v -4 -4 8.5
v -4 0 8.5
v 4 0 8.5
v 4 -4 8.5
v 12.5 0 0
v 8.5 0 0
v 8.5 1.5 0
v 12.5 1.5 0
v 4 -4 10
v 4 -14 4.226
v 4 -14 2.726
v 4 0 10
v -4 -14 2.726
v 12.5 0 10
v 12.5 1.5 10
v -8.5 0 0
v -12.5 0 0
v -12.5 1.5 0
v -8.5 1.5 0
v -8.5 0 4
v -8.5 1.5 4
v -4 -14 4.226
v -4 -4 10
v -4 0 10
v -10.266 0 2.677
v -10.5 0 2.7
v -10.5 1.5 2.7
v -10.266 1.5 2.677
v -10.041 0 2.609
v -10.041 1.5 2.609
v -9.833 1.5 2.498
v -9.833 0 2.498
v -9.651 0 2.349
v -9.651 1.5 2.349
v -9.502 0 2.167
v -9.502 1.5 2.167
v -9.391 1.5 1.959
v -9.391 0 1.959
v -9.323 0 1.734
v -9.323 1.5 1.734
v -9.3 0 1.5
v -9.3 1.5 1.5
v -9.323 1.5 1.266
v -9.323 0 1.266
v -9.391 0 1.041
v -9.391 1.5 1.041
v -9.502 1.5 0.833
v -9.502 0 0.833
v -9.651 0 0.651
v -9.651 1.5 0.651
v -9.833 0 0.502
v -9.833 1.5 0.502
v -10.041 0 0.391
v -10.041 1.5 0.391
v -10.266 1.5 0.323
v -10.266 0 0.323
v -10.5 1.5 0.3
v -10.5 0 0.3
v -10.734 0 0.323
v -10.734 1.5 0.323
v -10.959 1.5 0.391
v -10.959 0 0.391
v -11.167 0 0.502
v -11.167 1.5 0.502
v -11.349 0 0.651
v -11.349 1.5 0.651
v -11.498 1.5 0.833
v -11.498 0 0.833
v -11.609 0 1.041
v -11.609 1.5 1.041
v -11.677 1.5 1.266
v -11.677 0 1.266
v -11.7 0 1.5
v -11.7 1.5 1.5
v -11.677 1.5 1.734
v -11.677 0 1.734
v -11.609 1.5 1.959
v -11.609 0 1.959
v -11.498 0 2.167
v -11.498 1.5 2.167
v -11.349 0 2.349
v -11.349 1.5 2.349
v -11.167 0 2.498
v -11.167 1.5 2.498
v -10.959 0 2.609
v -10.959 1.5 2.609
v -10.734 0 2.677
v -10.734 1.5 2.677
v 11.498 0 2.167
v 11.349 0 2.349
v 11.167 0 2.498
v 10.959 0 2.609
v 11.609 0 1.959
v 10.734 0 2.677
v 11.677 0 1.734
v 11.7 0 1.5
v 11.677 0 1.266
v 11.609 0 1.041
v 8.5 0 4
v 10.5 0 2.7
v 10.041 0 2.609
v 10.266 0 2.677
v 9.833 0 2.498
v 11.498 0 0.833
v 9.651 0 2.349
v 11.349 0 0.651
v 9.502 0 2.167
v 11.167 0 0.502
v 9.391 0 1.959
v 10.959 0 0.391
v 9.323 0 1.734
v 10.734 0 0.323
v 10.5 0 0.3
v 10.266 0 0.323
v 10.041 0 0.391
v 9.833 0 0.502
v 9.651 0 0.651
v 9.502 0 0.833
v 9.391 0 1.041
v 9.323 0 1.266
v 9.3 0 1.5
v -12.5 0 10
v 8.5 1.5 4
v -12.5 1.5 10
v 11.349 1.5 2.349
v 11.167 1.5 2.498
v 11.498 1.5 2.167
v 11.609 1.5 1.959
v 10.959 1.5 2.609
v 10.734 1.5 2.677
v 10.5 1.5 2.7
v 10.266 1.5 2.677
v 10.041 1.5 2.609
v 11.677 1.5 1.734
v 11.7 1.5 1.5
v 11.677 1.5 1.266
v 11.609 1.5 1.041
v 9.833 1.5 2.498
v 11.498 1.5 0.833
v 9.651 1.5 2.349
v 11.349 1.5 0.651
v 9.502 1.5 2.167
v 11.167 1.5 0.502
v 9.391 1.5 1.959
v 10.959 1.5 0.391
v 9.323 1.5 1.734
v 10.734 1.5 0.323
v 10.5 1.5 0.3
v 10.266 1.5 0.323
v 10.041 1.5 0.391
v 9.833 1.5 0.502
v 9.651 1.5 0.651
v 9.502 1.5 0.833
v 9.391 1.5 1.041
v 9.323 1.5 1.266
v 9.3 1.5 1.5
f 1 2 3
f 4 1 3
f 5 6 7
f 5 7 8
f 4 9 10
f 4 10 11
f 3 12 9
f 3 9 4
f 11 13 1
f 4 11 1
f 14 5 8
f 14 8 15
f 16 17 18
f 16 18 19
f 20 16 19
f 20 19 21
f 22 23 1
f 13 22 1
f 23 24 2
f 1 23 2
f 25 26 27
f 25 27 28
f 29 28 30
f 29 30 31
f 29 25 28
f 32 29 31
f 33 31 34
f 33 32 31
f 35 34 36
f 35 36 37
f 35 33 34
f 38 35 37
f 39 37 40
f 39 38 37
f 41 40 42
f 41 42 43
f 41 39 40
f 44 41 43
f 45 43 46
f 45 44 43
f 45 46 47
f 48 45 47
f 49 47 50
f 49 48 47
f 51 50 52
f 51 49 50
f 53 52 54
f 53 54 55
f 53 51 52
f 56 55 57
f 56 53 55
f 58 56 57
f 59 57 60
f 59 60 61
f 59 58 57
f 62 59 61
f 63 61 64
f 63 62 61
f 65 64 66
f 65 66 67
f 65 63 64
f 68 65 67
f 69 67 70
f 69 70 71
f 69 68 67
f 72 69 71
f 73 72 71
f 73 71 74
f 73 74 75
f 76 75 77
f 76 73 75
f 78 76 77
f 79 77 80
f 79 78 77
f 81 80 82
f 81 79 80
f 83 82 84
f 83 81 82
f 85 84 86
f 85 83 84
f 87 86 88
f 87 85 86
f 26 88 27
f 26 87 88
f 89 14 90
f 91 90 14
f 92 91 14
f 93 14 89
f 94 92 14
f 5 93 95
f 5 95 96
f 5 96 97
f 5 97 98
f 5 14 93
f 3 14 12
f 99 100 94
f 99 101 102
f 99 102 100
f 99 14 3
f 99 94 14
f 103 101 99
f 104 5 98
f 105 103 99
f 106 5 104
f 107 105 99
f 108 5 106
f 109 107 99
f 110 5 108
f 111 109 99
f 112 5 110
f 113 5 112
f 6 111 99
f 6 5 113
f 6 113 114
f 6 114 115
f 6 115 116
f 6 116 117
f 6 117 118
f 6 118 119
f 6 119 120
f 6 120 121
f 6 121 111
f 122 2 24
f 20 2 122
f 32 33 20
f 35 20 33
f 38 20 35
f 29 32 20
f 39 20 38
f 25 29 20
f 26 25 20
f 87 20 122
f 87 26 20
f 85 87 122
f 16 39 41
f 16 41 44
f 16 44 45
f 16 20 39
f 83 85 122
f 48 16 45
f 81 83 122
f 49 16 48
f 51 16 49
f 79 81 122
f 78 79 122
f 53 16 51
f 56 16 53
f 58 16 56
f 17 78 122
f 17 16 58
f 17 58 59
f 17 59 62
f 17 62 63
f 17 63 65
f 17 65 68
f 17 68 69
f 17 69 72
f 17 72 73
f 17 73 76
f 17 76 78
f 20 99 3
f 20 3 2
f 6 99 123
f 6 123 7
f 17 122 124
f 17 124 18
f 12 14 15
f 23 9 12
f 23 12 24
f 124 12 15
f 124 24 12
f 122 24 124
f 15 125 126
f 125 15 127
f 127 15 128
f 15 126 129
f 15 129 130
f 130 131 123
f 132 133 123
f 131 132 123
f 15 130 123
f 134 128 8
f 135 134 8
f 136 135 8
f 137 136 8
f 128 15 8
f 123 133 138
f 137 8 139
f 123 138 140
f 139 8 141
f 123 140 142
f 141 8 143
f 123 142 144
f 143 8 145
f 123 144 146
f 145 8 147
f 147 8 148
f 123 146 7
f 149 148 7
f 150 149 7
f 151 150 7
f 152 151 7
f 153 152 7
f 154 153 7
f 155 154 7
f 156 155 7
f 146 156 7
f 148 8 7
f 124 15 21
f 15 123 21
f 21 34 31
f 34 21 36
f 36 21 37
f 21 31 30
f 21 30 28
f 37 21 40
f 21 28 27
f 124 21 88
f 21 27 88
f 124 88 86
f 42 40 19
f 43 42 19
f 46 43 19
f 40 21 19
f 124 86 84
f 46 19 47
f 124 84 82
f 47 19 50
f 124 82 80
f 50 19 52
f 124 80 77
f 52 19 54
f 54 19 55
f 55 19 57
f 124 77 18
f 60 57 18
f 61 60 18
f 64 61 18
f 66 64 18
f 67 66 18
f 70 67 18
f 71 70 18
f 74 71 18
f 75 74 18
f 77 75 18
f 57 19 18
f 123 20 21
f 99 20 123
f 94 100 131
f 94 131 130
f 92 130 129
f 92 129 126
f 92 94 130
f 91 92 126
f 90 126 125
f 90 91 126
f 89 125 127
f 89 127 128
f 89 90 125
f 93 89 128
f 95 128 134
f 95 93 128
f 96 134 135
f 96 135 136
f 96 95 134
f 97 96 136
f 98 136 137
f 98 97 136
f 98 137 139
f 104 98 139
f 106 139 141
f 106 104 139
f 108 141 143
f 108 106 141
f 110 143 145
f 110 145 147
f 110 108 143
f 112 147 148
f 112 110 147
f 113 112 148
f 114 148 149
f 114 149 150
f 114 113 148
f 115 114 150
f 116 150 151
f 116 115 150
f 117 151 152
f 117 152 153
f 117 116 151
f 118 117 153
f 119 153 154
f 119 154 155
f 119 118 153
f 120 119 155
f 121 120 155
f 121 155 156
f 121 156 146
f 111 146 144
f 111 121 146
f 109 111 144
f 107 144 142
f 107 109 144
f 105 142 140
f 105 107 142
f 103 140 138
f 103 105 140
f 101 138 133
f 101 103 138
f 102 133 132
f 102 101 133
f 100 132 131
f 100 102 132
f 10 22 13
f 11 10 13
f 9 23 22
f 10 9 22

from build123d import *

# Parameters (mm, degrees)
SKETCH1_R           = 1.2
BOSS_EXTRUDE1_DEPTH = 1.5
SKETCH2_W           = 8
SKETCH2_H           = 1.5
BOSS_EXTRUDE2_DEPTH = 4
BOSS_EXTRUDE3_DEPTH = 8


with BuildPart() as part:
    # Sketch1 → Boss-Extrude1 (new body)
    with BuildSketch(Plane(origin=(0, 0, 0), x_dir=(1, 0, 0), z_dir=(0, 1, 0))):
        Polygon((-8.5, 0), (-8.5, -4), (8.5, -4), (8.5, 0), (12.5, 0), (12.5, -10), (-12.5, -10), (-12.5, 0), align=None)
        with Locations(Location((-10.5, -1.5, 0), (0, 0, 270))):
            Circle(SKETCH1_R, mode=Mode.SUBTRACT)
        with Locations(Location((10.5, -1.5, 0), (0, 0, 270))):
            Circle(SKETCH1_R, mode=Mode.SUBTRACT)
    extrude(amount=BOSS_EXTRUDE1_DEPTH)

    # Sketch2 → Boss-Extrude2 (add)
    with BuildSketch(Plane.XZ):
        with Locations((0, 9.25)):
            Rectangle(SKETCH2_W, SKETCH2_H)
    extrude(amount=BOSS_EXTRUDE2_DEPTH)

    # Sketch3 → Boss-Extrude3 (add)
    with BuildSketch(Plane.ZY.offset(4)):
        Polygon((10, -4), (4.226497308, -14), (2.726497308, -14), (8.5, -4), align=None)
    extrude(amount=-BOSS_EXTRUDE3_DEPTH)


solid = part.part
